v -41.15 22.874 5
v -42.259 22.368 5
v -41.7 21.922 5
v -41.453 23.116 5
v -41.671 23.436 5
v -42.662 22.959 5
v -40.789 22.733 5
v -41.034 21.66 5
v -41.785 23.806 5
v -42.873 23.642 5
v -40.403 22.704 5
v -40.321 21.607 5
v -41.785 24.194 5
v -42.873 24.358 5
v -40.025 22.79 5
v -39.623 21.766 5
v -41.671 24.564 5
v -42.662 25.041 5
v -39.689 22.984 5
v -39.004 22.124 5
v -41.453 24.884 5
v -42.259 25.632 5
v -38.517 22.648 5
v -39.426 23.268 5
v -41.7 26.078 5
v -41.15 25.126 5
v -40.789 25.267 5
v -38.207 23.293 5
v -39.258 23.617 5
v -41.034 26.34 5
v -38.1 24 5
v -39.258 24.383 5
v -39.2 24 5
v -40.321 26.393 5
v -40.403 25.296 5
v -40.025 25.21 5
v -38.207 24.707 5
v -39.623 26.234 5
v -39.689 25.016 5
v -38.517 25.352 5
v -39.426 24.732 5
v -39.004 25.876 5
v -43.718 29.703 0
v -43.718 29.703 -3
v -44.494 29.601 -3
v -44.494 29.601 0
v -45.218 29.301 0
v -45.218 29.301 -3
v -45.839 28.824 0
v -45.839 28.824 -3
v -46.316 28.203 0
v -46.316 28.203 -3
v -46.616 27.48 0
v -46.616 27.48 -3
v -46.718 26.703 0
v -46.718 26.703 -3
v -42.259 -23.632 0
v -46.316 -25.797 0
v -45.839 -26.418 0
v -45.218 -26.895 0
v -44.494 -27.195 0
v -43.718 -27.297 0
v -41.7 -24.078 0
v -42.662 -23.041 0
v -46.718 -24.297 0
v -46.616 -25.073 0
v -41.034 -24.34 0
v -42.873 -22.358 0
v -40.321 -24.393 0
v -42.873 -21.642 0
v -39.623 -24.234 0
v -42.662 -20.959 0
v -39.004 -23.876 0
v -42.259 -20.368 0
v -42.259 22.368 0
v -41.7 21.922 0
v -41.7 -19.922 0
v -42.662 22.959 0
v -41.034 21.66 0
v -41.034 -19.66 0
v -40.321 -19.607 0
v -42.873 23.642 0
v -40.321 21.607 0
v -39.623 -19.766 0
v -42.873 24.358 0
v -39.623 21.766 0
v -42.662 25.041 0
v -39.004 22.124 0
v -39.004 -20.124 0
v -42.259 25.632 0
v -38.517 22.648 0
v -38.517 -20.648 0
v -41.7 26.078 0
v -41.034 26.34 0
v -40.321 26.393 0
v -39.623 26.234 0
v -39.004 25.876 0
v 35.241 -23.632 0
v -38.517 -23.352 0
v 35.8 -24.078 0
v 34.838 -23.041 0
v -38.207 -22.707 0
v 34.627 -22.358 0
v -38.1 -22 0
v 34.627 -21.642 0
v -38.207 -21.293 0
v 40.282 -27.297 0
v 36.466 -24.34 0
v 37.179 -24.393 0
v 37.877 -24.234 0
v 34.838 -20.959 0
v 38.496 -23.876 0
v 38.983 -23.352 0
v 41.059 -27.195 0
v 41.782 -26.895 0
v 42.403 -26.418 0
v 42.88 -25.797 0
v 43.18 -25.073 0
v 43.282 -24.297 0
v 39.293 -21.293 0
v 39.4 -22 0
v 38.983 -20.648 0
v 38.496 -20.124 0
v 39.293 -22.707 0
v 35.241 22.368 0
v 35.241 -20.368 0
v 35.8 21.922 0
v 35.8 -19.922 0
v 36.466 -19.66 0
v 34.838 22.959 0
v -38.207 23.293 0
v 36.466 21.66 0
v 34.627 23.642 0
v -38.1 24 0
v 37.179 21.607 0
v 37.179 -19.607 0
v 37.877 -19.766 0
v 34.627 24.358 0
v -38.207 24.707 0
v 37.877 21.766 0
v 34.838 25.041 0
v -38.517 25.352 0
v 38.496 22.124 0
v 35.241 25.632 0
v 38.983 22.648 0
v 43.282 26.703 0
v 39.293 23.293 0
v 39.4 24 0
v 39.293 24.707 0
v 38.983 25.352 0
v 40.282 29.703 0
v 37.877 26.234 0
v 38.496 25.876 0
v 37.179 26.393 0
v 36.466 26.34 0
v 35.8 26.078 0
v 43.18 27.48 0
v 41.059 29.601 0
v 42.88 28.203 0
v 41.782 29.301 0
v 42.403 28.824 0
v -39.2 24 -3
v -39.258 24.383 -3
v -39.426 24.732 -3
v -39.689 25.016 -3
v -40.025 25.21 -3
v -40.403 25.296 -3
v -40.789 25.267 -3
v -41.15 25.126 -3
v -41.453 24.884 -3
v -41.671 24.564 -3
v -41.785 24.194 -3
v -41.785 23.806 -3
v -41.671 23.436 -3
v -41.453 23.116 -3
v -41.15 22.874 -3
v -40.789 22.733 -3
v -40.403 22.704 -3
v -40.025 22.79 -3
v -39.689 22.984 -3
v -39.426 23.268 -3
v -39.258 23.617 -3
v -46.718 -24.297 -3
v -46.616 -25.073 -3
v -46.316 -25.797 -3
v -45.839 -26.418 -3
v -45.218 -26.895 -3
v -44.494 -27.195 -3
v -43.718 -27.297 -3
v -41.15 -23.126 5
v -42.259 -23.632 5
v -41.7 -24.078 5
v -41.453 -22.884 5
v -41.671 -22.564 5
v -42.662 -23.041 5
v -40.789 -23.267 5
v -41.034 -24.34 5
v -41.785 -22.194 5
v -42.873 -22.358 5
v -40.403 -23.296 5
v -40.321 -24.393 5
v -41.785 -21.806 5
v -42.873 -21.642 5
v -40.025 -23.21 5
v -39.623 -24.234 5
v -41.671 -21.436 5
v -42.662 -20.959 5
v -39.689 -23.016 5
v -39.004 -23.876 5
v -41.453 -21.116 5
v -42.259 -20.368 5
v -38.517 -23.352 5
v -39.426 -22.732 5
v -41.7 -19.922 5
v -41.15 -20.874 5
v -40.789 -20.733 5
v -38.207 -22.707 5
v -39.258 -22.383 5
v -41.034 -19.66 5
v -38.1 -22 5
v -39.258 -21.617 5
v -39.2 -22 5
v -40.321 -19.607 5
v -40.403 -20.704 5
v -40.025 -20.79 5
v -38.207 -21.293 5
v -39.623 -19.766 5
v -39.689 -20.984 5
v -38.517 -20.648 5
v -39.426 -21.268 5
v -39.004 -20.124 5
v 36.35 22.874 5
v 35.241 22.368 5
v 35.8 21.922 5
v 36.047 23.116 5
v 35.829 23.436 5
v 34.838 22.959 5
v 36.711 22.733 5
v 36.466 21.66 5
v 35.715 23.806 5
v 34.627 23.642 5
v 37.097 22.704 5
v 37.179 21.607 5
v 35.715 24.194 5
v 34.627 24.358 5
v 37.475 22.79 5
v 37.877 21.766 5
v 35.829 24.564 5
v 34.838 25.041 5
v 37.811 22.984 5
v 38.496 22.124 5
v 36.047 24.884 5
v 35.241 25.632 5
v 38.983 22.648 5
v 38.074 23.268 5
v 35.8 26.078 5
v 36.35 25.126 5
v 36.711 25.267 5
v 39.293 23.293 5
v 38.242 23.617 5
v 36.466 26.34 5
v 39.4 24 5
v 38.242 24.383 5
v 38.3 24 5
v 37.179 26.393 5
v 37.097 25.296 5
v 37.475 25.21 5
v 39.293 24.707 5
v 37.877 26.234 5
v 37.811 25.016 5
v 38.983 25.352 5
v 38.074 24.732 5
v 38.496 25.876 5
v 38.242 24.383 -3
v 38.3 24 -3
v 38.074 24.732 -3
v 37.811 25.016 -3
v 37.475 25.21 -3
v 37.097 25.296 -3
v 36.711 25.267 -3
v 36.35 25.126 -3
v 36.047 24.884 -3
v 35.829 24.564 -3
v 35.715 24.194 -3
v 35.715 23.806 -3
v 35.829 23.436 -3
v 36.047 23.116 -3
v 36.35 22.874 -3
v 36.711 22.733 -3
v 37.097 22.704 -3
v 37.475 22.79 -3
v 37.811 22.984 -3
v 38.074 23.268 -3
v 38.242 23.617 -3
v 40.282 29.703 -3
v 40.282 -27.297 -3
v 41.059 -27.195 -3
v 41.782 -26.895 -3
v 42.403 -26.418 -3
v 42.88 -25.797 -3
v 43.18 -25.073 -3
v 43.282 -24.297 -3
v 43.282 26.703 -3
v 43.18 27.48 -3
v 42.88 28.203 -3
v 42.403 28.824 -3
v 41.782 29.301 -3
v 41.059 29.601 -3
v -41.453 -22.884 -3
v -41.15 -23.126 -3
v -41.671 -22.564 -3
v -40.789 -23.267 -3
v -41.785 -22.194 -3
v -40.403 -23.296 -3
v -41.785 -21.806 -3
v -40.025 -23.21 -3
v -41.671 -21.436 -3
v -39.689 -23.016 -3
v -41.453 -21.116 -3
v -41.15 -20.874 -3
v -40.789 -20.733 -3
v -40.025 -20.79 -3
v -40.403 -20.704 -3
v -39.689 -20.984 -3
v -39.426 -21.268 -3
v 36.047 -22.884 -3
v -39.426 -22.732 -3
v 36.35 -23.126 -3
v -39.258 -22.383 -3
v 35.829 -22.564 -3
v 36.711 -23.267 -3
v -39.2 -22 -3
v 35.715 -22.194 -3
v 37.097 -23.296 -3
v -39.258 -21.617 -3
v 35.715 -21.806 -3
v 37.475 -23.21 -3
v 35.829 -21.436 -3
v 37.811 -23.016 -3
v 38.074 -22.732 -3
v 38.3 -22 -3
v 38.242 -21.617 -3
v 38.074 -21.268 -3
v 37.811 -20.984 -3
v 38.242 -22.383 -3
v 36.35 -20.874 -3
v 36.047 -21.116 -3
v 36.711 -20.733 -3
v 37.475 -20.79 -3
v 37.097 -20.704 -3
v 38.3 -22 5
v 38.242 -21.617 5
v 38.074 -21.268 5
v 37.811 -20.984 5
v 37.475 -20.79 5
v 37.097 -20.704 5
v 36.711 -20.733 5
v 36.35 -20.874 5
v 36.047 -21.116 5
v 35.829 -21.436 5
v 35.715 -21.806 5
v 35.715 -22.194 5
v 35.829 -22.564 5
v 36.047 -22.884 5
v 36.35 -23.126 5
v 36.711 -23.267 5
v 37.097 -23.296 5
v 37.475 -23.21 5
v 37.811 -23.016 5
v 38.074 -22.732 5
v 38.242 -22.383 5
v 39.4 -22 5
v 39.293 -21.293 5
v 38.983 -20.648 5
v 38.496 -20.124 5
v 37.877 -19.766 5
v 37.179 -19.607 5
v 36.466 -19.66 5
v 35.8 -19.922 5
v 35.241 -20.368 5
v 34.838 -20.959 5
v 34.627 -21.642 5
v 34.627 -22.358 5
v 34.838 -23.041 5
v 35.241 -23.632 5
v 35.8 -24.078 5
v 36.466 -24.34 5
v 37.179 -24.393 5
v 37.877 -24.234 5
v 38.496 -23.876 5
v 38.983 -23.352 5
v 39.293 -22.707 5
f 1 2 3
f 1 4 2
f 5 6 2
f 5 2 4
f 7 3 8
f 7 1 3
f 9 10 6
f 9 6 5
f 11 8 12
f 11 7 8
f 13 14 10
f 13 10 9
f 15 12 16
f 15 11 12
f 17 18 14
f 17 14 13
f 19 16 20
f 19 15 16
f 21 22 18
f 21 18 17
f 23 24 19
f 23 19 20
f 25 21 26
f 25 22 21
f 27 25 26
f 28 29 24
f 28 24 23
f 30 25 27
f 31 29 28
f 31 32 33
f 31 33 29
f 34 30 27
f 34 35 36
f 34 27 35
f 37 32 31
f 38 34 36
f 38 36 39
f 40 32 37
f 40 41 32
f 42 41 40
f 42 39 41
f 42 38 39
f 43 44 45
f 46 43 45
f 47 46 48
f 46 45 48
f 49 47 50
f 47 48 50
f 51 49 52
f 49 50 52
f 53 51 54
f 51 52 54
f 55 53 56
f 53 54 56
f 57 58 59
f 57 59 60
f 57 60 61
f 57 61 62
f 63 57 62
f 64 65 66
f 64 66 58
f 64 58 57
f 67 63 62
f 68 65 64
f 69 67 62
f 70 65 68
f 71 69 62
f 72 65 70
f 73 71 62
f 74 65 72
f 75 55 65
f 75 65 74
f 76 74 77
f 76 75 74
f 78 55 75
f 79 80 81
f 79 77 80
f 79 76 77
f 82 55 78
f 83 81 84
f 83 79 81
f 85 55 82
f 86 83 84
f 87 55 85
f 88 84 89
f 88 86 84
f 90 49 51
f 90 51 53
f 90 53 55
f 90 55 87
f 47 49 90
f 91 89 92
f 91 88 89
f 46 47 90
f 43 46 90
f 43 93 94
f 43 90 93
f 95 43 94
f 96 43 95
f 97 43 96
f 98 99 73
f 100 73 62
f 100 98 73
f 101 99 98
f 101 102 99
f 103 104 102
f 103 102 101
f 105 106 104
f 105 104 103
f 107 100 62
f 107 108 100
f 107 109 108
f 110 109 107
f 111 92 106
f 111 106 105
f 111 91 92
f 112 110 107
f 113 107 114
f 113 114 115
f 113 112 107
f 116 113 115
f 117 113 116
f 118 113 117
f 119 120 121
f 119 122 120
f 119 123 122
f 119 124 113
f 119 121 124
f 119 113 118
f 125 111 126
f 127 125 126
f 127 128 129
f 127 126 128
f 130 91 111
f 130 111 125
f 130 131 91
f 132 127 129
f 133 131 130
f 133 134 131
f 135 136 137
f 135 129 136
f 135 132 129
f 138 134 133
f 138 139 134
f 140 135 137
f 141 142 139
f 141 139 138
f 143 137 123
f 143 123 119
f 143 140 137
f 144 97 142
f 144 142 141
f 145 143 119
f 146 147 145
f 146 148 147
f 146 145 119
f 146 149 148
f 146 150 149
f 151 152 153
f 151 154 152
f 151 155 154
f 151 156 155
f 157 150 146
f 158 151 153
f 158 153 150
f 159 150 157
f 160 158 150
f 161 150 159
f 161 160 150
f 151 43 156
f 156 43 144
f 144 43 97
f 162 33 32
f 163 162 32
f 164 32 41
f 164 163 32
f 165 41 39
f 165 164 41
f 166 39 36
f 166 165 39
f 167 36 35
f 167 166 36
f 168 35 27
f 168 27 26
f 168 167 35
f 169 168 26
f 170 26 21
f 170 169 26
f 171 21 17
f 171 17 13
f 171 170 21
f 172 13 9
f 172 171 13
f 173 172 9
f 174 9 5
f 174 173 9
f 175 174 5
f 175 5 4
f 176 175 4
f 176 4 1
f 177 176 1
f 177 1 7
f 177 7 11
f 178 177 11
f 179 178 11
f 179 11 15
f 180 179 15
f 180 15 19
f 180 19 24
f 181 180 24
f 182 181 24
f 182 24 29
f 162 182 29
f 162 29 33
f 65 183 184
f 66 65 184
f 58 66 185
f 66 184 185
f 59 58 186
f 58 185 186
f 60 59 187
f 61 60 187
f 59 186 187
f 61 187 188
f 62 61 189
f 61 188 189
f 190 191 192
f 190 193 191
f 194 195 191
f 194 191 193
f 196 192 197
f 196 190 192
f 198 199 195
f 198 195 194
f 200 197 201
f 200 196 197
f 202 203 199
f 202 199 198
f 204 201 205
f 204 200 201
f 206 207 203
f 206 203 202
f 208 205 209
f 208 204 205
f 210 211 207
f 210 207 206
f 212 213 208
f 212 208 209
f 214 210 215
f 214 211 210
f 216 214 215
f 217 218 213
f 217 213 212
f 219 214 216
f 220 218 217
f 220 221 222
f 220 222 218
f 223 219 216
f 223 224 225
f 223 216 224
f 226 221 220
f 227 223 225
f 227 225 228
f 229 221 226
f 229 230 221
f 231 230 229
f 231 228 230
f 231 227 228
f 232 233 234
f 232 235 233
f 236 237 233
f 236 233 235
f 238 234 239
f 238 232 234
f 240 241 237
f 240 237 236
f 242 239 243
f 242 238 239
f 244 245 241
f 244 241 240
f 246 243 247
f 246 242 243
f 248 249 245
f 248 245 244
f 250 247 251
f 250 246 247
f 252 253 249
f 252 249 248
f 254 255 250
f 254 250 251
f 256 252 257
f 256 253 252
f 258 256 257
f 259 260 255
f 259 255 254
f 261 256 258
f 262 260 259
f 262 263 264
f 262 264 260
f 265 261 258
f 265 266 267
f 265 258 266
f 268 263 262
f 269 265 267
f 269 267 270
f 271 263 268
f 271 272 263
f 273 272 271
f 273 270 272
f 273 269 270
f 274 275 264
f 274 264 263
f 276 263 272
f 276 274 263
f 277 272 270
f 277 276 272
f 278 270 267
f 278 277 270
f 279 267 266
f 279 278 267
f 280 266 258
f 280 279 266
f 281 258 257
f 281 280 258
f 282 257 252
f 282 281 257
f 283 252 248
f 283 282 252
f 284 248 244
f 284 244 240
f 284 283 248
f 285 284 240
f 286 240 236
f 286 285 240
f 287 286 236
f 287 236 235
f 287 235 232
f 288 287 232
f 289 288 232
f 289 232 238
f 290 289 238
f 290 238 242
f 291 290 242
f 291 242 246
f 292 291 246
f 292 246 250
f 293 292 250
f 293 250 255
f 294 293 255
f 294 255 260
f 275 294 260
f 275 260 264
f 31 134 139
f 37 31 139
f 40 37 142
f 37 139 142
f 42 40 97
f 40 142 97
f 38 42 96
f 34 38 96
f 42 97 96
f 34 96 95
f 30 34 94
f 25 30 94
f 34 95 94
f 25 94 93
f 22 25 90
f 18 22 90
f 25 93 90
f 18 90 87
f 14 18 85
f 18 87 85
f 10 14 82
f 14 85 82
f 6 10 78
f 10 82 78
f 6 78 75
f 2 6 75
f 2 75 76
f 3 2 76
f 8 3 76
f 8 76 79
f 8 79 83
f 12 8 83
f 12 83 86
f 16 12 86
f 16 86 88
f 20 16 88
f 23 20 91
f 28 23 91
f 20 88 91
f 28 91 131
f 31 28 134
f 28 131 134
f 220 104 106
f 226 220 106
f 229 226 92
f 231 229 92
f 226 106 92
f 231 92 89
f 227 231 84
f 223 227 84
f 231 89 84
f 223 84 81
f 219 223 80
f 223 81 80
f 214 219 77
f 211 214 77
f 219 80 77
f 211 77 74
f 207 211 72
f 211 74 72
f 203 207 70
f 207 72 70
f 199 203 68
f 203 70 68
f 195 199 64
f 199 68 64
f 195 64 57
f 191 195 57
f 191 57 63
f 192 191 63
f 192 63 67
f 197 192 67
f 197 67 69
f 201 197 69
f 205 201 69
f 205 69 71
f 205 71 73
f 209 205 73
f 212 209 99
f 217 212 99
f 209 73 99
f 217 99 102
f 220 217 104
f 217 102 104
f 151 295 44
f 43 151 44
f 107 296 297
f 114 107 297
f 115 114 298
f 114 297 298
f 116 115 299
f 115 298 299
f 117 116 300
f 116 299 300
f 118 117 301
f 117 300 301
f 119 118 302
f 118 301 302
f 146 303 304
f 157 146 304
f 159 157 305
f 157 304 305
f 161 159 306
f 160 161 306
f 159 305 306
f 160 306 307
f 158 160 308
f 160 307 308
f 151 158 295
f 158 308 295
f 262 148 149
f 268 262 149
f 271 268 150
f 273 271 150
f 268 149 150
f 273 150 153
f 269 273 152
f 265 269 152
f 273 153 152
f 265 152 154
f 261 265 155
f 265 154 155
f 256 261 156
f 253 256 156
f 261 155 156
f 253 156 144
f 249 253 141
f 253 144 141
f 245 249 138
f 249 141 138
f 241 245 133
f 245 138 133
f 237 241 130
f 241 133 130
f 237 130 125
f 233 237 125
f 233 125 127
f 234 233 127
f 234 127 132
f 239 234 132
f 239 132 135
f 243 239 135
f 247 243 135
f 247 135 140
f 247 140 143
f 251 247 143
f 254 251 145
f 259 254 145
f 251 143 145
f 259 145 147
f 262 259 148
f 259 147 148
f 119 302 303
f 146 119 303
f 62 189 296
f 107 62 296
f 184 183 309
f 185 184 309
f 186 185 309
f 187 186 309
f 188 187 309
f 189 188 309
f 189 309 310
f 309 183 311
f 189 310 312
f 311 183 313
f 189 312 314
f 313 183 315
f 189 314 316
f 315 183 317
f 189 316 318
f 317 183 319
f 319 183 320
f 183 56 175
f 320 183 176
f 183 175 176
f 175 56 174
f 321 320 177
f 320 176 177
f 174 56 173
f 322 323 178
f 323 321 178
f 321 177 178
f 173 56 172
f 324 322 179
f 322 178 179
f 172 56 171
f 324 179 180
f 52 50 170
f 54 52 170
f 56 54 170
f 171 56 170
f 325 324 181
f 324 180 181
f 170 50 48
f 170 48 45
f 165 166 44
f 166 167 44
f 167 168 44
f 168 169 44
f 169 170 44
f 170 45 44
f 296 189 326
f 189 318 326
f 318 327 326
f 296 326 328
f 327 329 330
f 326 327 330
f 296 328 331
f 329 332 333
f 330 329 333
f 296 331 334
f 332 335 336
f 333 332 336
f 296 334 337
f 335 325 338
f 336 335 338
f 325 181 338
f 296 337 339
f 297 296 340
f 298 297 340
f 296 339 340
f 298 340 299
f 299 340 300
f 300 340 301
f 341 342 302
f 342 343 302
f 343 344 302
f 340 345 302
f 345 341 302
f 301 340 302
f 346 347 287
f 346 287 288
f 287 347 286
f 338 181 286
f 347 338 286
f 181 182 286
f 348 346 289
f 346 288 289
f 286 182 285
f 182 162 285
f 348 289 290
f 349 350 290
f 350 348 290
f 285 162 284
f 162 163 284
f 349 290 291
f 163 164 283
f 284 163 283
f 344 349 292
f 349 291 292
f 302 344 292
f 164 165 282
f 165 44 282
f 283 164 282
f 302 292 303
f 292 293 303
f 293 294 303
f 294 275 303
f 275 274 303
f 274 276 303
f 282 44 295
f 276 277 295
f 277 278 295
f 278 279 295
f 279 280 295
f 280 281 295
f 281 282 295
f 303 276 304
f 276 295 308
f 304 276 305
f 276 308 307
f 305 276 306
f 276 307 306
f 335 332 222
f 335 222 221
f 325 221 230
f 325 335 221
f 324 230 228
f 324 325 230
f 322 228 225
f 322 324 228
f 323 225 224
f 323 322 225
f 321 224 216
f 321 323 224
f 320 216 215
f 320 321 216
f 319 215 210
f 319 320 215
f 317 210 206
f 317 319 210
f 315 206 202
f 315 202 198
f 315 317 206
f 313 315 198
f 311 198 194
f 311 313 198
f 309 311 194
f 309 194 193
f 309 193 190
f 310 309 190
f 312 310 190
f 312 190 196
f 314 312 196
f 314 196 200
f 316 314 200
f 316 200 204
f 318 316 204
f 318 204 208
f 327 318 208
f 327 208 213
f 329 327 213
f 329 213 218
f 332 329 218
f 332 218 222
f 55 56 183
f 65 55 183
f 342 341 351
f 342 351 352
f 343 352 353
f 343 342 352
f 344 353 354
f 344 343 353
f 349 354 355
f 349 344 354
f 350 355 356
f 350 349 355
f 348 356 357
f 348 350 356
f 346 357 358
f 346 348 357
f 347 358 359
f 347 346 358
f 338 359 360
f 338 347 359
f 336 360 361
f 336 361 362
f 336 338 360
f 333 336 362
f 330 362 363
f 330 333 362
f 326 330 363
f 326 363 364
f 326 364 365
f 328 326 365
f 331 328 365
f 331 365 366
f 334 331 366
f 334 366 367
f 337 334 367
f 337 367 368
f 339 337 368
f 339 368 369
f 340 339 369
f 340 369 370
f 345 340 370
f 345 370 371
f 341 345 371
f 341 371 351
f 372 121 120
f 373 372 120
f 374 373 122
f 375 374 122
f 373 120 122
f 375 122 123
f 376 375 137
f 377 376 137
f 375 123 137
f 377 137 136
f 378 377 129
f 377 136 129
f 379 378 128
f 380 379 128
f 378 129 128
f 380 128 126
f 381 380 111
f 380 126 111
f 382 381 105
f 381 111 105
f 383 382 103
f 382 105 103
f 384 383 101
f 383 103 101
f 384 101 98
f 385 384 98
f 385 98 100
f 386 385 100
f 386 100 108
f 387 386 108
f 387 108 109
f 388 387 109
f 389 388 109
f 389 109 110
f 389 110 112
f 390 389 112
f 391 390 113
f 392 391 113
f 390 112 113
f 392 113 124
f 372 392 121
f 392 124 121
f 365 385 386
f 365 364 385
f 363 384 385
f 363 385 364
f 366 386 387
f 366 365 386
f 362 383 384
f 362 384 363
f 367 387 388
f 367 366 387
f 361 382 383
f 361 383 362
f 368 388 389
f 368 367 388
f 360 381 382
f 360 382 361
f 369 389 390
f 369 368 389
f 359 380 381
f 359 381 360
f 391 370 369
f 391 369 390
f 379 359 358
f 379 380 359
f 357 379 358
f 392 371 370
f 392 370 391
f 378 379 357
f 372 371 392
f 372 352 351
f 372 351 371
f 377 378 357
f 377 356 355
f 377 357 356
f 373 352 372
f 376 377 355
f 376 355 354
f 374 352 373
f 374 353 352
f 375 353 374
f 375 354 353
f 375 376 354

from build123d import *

# Parameters (mm, degrees)
SKETCH_3_R       = 2.4
SKETCH_3_R_2     = 1.3
EXTRUDE_5_DEPTH  = 5.000409789
SKETCH_3_8_R     = 2.4
SKETCH_3_8_R_2   = 1.3
EXTRUDE_6_DEPTH  = 5
SKETCH_3_9_R     = 2.4
SKETCH_3_9_R_2   = 1.3
EXTRUDE_7_DEPTH  = 5
SKETCH_3_10_R    = 2.4
SKETCH_3_10_R_2  = 1.3
EXTRUDE_8_DEPTH  = 5
EXTRUDE_START    = -3
SKETCH_3_17_R    = 1.3
EXTRUDE_12_DEPTH = 3


with BuildPart() as part:
    # 草图3 → 凸台-拉伸5 (new body)
    with BuildSketch(Plane.XY):
        with Locations((-40.5, 24)):
            Circle(SKETCH_3_R)
        with Locations((-40.5, 24)):
            Circle(SKETCH_3_R_2, mode=Mode.SUBTRACT)
    extrude(amount=EXTRUDE_5_DEPTH)



with BuildPart() as body_2:
    # 草图3<8> → 凸台-拉伸6 (new body)
    with BuildSketch(Plane.XY):
        with Locations((37, 24)):
            Circle(SKETCH_3_8_R)
        with Locations((37, 24)):
            Circle(SKETCH_3_8_R_2, mode=Mode.SUBTRACT)
    extrude(amount=EXTRUDE_6_DEPTH)


with BuildPart() as body_3:
    # 草图3<9> → 凸台-拉伸7 (new body)
    with BuildSketch(Plane.XY):
        with Locations((37, -22)):
            Circle(SKETCH_3_9_R)
        with Locations((37, -22)):
            Circle(SKETCH_3_9_R_2, mode=Mode.SUBTRACT)
    extrude(amount=EXTRUDE_7_DEPTH)


with BuildPart() as body_4:
    # 草图3<10> → 凸台-拉伸8 (new body)
    with BuildSketch(Plane.XY):
        with Locations((-40.5, -22)):
            Circle(SKETCH_3_10_R)
        with Locations((-40.5, -22)):
            Circle(SKETCH_3_10_R_2, mode=Mode.SUBTRACT)
    extrude(amount=EXTRUDE_8_DEPTH)


with BuildPart() as part_1:
    add(part.part)

    add(body_2.part)  # 凸台-拉伸12 merges body 2

    add(body_3.part)  # 凸台-拉伸12 merges body 3

    add(body_4.part)  # 凸台-拉伸12 merges body 4
    # 草图3<17> → 凸台-拉伸12 (add)
    with BuildSketch(Plane.XY.offset(EXTRUDE_START)):
        with BuildLine():
            Line((40.282145442, 29.703068159), (-43.717854558, 29.703068159))
            ThreePointArc((-43.717854558, 29.703068159), (-45.839174902, 28.824388502), (-46.717854558, 26.703068159))
            Line((-46.717854558, 26.703068159), (-46.717854558, -24.296931841))
            ThreePointArc((-46.717854558, -24.296931841), (-45.839174902, -26.418252185), (-43.717854558, -27.296931841))
            Line((-43.717854558, -27.296931841), (40.282145442, -27.296931841))
            ThreePointArc((40.282145442, -27.296931841), (42.403465785, -26.418252185), (43.282145442, -24.296931841))
            Line((43.282145442, -24.296931841), (43.282145442, 26.703068159))
            ThreePointArc((43.282145442, 26.703068159), (42.403465785, 28.824388502), (40.282145442, 29.703068159))
        make_face()
        with Locations((37, 24)):
            Circle(SKETCH_3_17_R, mode=Mode.SUBTRACT)
        with Locations((37, -22)):
            Circle(SKETCH_3_17_R, mode=Mode.SUBTRACT)
        with Locations((-40.5, 24)):
            Circle(SKETCH_3_17_R, mode=Mode.SUBTRACT)
        with Locations((-40.5, -22)):
            Circle(SKETCH_3_17_R, mode=Mode.SUBTRACT)
    extrude(amount=EXTRUDE_12_DEPTH)


solid = part_1.part
